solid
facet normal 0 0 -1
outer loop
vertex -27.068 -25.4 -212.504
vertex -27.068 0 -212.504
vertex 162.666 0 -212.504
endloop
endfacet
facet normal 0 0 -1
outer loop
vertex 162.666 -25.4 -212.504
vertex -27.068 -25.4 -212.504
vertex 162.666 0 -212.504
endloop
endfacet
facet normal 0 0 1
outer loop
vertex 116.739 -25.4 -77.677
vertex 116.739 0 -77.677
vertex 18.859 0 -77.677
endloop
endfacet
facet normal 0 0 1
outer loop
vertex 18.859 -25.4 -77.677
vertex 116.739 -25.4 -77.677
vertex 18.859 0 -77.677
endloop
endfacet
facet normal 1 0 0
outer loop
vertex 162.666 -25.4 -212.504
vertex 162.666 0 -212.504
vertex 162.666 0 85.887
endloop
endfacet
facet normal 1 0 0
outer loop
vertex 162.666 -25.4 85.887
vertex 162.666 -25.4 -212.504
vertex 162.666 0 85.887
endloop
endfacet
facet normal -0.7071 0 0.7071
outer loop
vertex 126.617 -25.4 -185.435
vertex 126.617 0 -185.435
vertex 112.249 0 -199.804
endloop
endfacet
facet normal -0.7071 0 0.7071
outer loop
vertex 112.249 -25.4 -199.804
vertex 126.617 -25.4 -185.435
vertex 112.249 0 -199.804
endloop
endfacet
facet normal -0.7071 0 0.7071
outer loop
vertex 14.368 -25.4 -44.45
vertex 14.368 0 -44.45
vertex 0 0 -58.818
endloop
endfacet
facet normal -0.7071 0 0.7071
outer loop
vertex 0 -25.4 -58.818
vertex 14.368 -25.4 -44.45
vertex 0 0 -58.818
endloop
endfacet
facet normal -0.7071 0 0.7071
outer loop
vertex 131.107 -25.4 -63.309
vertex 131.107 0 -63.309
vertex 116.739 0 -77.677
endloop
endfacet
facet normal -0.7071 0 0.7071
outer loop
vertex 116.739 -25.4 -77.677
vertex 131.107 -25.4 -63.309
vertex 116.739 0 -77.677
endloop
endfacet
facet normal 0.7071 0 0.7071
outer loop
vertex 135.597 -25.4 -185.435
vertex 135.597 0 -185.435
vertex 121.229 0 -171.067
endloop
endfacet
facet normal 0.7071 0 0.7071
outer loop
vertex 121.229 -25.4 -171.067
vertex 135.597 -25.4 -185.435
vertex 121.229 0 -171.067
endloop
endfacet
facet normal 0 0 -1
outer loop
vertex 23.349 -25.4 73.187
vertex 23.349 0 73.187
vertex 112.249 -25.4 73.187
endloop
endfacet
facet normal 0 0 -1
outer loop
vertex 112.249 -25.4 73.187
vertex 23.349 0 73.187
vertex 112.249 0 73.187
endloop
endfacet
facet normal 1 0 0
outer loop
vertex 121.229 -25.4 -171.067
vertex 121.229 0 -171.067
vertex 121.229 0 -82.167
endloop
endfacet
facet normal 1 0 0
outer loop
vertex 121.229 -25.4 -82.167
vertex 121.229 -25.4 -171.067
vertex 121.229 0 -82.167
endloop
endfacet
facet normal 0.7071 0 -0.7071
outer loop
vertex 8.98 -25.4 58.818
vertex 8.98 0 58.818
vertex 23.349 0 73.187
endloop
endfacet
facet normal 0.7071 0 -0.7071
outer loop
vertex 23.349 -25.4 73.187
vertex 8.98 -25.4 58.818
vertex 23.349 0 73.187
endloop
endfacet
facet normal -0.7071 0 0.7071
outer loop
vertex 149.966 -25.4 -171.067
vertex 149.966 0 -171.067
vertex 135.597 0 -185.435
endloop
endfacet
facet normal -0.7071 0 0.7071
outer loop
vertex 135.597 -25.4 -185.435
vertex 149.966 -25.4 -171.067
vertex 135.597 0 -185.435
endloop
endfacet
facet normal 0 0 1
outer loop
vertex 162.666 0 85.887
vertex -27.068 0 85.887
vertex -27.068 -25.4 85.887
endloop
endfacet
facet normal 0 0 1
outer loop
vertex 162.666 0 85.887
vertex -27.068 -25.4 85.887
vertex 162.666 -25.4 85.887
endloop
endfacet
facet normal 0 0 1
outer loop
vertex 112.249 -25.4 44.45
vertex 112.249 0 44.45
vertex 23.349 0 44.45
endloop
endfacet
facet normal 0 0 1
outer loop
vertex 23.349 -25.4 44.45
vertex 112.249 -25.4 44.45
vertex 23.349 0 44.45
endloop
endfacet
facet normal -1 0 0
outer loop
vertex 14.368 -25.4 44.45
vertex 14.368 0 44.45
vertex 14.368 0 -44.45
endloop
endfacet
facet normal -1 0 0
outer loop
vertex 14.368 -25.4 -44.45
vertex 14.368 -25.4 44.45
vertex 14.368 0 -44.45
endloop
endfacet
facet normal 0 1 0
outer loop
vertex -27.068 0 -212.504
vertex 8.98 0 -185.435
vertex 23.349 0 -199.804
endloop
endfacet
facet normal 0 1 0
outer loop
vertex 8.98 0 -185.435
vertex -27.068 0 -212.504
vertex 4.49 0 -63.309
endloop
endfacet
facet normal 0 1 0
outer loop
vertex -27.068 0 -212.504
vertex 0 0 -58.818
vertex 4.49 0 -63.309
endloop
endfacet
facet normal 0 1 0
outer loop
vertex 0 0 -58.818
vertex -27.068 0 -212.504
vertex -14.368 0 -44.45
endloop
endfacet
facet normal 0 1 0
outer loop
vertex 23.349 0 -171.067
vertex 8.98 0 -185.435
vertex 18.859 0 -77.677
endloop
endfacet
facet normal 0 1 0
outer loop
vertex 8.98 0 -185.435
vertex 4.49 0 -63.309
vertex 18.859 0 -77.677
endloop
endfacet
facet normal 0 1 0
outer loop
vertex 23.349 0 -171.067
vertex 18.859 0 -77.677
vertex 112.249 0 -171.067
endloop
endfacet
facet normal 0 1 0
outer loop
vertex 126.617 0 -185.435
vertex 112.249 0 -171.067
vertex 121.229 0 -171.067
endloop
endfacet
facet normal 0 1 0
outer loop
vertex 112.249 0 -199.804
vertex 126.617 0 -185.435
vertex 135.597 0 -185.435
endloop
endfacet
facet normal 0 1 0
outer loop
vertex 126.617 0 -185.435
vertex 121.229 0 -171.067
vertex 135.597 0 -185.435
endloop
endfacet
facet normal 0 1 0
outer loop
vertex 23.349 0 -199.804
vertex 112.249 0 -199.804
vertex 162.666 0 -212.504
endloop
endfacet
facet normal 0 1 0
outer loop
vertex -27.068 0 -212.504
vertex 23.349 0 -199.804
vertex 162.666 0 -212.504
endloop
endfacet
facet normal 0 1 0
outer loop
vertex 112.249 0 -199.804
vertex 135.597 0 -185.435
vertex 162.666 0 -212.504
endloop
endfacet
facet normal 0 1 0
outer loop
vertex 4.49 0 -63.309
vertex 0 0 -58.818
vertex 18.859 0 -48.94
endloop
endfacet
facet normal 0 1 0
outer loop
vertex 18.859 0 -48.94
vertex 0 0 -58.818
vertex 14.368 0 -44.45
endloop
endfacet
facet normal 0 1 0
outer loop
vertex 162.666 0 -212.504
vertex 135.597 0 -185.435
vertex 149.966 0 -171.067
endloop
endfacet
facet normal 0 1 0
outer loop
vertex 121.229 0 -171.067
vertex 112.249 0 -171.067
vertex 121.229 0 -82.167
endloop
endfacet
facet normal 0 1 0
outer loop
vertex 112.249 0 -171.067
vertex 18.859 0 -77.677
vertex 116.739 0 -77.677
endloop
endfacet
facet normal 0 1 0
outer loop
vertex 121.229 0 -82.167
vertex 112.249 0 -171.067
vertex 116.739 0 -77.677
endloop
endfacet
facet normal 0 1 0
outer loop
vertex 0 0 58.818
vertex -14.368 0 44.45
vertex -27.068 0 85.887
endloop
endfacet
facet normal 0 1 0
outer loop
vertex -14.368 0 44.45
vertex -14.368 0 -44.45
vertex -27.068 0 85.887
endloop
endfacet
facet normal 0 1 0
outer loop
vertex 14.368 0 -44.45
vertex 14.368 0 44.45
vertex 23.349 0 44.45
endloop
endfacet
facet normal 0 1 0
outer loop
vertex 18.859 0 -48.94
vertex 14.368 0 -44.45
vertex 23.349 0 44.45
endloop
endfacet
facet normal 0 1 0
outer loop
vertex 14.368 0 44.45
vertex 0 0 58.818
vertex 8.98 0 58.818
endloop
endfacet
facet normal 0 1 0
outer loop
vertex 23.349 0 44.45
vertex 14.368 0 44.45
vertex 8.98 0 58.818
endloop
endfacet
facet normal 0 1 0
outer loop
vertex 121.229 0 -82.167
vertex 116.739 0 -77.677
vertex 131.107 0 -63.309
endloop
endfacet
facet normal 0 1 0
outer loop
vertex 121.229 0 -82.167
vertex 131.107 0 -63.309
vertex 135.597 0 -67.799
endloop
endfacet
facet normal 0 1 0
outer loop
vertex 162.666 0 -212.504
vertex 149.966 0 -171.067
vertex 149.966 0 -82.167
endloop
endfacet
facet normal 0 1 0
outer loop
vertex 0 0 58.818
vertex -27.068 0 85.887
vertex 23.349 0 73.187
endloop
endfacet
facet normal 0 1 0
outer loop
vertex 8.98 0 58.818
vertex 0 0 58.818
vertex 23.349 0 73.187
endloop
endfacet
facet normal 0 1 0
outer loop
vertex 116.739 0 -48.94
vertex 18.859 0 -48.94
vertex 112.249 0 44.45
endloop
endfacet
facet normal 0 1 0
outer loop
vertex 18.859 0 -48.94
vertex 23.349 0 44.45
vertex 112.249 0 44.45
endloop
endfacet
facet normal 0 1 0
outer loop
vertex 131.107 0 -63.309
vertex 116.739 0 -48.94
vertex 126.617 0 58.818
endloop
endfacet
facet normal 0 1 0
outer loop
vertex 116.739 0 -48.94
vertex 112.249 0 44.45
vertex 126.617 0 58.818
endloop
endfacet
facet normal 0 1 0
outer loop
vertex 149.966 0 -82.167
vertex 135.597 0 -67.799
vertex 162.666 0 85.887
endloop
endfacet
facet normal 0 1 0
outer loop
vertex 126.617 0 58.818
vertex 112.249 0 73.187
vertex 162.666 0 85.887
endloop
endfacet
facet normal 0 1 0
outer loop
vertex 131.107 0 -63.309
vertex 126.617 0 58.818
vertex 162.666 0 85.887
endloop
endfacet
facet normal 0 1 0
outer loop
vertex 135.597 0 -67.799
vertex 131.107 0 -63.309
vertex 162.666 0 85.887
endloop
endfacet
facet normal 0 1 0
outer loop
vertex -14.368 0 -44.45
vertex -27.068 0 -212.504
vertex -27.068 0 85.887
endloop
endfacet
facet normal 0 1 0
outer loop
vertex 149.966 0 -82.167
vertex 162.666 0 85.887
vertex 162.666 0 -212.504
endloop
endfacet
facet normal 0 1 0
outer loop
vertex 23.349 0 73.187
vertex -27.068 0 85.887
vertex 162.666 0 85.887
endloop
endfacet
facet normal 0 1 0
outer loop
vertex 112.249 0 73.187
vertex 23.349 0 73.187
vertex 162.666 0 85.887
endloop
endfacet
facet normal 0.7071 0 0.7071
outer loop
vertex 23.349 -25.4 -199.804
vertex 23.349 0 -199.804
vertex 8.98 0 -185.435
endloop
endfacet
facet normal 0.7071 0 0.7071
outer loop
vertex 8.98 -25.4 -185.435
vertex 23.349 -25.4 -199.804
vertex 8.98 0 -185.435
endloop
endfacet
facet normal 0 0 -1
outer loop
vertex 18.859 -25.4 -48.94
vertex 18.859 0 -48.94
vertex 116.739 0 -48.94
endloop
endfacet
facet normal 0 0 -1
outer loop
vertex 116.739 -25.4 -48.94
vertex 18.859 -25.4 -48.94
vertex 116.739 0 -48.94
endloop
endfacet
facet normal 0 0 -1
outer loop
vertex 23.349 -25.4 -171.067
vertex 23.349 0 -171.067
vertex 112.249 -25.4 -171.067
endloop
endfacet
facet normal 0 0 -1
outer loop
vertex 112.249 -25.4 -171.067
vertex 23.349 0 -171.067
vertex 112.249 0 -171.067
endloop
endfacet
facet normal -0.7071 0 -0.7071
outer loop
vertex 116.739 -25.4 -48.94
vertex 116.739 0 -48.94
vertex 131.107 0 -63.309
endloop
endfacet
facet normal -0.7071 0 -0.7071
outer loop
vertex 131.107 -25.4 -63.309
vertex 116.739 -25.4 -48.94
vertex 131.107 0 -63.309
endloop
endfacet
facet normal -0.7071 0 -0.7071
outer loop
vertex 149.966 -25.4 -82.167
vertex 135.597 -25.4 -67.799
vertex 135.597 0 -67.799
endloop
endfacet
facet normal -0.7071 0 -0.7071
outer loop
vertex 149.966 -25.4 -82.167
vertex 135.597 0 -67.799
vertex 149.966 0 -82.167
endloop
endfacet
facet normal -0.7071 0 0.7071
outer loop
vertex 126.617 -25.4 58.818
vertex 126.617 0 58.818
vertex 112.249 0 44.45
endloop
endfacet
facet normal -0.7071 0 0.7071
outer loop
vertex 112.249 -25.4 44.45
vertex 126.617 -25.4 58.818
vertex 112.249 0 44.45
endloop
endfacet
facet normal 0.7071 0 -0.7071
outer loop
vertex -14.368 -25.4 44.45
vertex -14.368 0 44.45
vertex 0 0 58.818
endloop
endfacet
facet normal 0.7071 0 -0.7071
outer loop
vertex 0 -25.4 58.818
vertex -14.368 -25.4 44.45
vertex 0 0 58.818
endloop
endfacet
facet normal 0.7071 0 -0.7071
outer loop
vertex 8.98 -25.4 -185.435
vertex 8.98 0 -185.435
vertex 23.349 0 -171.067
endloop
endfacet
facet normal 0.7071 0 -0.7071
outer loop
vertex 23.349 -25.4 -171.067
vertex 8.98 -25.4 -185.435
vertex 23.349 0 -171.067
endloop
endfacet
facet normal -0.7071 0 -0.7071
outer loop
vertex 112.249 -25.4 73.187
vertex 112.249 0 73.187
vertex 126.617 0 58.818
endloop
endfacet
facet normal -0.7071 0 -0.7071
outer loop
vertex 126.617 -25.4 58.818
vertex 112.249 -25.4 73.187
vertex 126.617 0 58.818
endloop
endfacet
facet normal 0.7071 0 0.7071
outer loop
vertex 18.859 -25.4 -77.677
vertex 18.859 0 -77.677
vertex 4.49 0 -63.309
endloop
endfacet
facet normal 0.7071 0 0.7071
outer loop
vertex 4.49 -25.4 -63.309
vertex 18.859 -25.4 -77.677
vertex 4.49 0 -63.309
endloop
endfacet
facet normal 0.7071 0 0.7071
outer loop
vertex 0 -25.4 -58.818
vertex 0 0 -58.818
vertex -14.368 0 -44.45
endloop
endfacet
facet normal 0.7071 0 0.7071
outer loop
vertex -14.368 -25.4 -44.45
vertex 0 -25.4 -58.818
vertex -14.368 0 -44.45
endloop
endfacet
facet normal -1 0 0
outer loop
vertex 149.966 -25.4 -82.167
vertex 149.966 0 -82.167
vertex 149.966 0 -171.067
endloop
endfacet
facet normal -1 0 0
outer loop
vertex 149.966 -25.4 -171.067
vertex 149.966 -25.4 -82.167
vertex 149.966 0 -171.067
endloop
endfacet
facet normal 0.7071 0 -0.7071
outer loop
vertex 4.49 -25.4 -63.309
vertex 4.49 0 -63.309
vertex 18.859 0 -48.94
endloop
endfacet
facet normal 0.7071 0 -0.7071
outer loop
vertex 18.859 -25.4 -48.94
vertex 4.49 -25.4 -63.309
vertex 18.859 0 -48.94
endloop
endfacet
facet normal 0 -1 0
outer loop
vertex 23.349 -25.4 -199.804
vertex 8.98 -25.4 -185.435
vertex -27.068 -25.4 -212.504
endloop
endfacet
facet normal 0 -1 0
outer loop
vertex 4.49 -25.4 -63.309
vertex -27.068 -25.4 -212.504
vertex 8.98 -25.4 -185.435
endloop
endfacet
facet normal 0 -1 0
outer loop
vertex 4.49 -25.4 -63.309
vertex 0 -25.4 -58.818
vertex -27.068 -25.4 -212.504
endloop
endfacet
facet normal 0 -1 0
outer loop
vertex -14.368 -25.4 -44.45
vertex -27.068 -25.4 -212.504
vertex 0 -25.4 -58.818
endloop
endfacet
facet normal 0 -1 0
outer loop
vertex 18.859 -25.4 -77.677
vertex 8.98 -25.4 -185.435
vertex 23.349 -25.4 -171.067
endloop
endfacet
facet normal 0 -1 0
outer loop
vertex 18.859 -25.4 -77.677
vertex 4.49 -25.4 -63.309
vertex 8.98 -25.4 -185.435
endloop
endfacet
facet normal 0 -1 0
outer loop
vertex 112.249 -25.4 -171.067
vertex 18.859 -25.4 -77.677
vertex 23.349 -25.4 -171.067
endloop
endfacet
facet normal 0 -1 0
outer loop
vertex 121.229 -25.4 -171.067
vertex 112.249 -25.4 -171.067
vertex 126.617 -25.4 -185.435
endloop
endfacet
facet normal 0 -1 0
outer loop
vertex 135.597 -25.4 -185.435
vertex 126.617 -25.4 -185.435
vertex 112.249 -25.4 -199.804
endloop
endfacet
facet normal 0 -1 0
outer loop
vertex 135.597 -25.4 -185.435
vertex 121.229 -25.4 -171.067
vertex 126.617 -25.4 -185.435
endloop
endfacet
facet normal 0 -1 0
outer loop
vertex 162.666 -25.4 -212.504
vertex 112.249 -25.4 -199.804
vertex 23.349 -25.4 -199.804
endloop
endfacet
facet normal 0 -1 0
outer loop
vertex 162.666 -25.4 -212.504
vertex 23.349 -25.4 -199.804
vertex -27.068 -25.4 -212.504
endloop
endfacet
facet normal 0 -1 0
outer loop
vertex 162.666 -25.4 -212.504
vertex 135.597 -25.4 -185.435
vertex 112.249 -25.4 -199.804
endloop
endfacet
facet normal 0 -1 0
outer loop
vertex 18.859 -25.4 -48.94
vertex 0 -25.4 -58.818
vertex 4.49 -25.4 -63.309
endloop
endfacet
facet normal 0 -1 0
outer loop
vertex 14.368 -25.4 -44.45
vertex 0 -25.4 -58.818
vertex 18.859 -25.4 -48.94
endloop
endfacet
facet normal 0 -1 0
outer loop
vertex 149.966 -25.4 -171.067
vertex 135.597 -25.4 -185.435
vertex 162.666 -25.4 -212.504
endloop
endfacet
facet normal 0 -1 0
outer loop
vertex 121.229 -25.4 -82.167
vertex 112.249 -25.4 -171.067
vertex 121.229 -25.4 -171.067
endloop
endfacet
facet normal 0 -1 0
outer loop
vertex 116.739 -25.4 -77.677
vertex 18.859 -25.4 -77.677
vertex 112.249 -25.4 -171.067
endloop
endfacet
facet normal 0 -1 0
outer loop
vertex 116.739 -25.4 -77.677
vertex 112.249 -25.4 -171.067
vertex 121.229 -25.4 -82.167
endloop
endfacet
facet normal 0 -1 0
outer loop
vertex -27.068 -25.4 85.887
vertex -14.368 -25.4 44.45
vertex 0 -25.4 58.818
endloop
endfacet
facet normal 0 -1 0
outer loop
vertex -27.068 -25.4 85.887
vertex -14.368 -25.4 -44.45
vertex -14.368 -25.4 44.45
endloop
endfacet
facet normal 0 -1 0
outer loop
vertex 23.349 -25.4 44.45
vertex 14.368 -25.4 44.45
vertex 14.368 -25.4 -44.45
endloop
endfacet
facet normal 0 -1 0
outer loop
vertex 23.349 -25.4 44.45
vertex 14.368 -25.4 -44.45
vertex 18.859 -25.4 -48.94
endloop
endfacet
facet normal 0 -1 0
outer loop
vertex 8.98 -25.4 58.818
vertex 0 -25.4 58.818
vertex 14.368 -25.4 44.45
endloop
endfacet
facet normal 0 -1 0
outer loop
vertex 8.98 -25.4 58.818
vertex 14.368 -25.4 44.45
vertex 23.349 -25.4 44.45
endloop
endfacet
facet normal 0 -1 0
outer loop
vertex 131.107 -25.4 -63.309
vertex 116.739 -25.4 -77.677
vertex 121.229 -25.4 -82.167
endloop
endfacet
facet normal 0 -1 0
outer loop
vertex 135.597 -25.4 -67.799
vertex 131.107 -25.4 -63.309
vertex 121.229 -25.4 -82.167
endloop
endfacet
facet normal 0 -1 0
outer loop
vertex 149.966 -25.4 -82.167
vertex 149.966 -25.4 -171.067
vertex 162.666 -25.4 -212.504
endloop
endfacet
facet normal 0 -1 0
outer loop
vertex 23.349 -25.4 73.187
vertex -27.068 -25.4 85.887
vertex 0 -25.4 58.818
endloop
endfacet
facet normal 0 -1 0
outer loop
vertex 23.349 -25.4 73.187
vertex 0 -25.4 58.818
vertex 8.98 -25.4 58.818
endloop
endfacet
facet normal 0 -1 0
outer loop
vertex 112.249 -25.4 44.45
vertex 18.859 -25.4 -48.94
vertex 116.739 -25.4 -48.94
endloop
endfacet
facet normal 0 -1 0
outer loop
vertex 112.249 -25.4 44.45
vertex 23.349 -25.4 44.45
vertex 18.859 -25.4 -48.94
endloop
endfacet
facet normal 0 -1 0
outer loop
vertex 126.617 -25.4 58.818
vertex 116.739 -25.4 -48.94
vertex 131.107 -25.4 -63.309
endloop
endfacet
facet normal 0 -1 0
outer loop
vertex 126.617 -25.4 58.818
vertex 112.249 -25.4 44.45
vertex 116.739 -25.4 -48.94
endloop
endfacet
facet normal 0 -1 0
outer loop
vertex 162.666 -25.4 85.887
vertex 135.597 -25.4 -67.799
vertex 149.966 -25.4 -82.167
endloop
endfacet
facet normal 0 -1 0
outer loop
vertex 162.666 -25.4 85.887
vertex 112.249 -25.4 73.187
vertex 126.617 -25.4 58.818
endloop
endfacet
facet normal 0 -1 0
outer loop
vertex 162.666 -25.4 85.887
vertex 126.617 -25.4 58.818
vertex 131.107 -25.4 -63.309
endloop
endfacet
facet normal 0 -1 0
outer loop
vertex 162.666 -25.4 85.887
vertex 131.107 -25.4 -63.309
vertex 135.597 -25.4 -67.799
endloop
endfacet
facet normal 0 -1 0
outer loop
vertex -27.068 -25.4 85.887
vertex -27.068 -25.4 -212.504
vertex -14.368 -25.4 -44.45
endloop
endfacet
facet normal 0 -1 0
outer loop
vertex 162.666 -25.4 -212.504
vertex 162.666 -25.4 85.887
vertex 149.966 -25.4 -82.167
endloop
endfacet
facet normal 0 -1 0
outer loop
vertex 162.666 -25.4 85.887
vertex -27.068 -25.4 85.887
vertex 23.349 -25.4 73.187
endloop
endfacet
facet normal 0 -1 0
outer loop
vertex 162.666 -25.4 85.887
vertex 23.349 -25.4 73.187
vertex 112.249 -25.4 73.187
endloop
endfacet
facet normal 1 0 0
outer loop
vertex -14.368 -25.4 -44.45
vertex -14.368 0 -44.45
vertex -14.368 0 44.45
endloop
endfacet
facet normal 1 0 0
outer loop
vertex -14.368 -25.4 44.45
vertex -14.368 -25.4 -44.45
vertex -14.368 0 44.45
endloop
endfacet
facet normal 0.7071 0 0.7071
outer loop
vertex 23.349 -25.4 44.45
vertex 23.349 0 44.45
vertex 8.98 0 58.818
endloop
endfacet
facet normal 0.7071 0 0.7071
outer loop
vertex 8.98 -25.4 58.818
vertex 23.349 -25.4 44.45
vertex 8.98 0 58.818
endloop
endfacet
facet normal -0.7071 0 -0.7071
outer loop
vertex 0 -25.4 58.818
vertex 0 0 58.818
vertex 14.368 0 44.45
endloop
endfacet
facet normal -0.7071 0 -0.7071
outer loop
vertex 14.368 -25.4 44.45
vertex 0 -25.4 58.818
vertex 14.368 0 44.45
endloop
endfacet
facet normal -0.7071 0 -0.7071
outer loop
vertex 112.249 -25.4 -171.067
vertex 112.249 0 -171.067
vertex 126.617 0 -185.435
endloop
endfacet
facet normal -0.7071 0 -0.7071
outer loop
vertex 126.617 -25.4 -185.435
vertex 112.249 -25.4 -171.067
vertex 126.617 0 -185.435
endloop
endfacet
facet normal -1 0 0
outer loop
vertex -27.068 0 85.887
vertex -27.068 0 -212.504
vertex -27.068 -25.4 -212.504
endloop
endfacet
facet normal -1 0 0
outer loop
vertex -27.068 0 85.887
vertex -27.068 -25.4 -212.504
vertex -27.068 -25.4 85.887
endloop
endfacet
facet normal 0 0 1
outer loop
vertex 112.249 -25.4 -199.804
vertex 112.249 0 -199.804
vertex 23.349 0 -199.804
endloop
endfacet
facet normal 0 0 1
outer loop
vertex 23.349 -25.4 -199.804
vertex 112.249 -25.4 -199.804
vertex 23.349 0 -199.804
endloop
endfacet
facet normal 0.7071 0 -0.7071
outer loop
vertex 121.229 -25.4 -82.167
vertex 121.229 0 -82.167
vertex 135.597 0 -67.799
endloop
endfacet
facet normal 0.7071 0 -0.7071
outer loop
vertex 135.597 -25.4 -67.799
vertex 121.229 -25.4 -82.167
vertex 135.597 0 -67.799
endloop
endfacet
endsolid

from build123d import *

# Parameters (mm, degrees)
F0_W     = 189.734152
F0_H     = 298.390715
F1_DEPTH = 25.4


with BuildPart() as f1:
    # F0 (on Front) → F1 (new body)
    with BuildSketch(Plane.XZ):
        with Locations((67.798666, -63.308537)):
            Rectangle(F0_W, F0_H)
        Polygon((0, -58.81841), (-14.36841, -44.45), (-14.36841, 44.45), (0, 58.81841), (8.980256, 58.81841), (23.348666, 73.18682), (112.248666, 73.18682), (126.617076, 58.81841), (135.597332, 58.81841), (149.965742, 44.45), (149.965742, -44.45), (135.597332, -58.81841), (135.597332, -67.798666), (149.965742, -82.167076), (149.965742, -171.067076), (135.597332, -185.435486), (126.617076, -185.435486), (112.248666, -199.803895), (23.348666, -199.803895), (8.980256, -185.435486), (0, -185.435486), (-14.36841, -171.067076), (-14.36841, -82.167076), (0, -67.798666), align=None, mode=Mode.SUBTRACT)
        Polygon((14.36841, 44.45), (14.36841, -44.45), (0, -58.81841), (0, -67.798666), (4.490128, -63.308538), (18.858538, -48.940128), (116.738794, -48.940128), (131.107204, -63.308538), (135.597332, -67.798666), (135.597332, -58.81841), (121.228922, -44.45), (121.228922, 44.45), (135.597332, 58.81841), (126.617076, 58.81841), (112.248666, 44.45), (23.348666, 44.45), (8.980256, 58.81841), (0, 58.81841), align=None)
        Polygon((4.490128, -63.308538), (0, -67.798666), (14.36841, -82.167076), (14.36841, -171.067076), (0, -185.435486), (8.980256, -185.435486), (23.348666, -171.067076), (112.248666, -171.067076), (126.617076, -185.435486), (135.597332, -185.435486), (121.228922, -171.067076), (121.228922, -82.167076), (135.597332, -67.798666), (131.107204, -63.308538), (116.738794, -77.676948), (18.858538, -77.676948), align=None)
        Polygon((149.965742, 44.45), (135.597332, 58.81841), (121.228922, 44.45), (121.228922, -44.45), (135.597332, -58.81841), (149.965742, -44.45), align=None)
        Polygon((14.36841, -82.167076), (0, -67.798666), (-14.36841, -82.167076), (-14.36841, -171.067076), (0, -185.435486), (14.36841, -171.067076), align=None)
    extrude(amount=F1_DEPTH)


solid = f1.part
